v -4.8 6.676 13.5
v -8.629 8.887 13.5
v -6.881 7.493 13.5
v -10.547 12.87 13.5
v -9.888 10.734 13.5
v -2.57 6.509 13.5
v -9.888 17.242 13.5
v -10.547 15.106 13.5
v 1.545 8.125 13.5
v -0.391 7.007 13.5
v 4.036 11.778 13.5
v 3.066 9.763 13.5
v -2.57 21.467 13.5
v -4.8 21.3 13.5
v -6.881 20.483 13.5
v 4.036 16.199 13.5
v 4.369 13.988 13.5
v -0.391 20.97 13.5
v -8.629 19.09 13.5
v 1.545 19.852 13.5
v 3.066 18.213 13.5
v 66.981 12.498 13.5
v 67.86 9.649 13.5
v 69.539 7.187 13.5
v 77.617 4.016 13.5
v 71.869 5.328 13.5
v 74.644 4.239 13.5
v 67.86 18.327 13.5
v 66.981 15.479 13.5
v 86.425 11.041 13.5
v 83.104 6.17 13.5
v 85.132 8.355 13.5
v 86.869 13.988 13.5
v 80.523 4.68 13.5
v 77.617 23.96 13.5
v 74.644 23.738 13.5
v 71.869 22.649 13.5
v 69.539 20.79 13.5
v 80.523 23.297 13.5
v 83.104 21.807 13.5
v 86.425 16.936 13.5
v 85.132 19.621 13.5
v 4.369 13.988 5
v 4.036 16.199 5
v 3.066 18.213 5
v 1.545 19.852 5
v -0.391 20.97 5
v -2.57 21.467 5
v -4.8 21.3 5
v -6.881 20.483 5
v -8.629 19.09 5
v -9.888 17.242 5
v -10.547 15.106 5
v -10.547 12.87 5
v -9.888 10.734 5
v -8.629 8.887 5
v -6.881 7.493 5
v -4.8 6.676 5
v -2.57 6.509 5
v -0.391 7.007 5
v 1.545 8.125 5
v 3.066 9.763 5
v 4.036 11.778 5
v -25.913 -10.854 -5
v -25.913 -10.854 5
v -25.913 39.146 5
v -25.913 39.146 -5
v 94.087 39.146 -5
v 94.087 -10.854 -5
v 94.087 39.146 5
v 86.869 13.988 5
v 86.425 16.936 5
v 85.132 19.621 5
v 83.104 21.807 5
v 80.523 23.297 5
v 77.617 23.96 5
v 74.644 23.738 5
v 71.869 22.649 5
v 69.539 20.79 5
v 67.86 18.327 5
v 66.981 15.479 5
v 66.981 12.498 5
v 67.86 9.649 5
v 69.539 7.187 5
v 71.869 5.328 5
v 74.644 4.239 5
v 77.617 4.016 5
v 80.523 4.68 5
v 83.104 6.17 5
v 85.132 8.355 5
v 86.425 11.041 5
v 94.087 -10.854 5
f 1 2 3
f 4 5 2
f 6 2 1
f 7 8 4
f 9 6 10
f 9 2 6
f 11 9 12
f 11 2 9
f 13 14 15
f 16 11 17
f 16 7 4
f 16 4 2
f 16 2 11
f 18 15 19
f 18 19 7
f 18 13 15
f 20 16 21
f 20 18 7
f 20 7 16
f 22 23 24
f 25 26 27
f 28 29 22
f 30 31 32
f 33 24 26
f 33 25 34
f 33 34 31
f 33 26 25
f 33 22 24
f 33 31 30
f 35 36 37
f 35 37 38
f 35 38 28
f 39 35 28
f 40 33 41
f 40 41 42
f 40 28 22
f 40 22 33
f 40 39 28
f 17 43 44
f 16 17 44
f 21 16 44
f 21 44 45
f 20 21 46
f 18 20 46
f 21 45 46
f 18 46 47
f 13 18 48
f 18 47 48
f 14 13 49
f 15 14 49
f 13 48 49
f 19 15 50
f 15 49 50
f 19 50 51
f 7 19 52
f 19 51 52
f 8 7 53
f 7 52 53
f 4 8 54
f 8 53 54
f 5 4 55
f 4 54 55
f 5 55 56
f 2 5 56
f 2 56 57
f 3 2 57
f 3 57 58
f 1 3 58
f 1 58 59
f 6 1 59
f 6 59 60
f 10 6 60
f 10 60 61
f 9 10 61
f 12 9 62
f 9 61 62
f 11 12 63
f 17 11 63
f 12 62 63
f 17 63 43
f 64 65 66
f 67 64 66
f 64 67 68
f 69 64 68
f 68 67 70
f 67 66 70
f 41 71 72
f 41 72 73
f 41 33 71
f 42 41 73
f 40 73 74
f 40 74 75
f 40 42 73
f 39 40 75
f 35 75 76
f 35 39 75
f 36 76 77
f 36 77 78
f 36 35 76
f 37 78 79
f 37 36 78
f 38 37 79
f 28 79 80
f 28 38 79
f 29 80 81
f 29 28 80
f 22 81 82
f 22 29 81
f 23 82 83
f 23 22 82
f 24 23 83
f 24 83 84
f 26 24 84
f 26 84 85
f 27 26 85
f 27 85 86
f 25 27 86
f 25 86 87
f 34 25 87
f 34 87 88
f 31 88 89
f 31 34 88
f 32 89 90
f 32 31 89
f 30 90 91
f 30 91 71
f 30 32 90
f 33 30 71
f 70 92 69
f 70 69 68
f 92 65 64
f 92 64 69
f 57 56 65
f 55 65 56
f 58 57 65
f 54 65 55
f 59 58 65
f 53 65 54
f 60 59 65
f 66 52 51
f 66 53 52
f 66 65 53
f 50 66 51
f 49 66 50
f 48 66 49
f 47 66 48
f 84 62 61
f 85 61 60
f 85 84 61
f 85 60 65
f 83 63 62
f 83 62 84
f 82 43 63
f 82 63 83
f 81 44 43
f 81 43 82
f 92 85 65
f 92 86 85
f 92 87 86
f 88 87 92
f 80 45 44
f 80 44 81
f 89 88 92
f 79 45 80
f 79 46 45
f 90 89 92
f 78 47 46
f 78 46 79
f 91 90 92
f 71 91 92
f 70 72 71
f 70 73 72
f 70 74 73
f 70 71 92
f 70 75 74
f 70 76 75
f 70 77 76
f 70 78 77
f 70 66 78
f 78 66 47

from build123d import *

# Parameters (mm, degrees)
SKETCH_1_W      = 120
SKETCH_1_H      = 50
EXTRUDE_1_DEPTH = 5
SKETCH_2_R      = 7.5
SKETCH_2_R_2    = 10
EXTRUDE_2_DEPTH = 8.5


with BuildPart() as part:
    # 草图1 → 凸台-拉伸1 (new, symmetric)
    with BuildSketch(Plane.XY):
        with Locations((34.086506066, 14.145511968)):
            Rectangle(SKETCH_1_W, SKETCH_1_H)
    extrude(amount=EXTRUDE_1_DEPTH, both=True)

    # 草图2 → 凸台-拉伸2 (add, symmetric)
    with BuildSketch(Plane.XY.offset(5)):
        with Locations((-3.130706557, 13.98825614)):
            Circle(SKETCH_2_R)
        with Locations((76.869293443, 13.98825614)):
            Circle(SKETCH_2_R_2)
    extrude(amount=EXTRUDE_2_DEPTH, both=True)


solid = part.part
